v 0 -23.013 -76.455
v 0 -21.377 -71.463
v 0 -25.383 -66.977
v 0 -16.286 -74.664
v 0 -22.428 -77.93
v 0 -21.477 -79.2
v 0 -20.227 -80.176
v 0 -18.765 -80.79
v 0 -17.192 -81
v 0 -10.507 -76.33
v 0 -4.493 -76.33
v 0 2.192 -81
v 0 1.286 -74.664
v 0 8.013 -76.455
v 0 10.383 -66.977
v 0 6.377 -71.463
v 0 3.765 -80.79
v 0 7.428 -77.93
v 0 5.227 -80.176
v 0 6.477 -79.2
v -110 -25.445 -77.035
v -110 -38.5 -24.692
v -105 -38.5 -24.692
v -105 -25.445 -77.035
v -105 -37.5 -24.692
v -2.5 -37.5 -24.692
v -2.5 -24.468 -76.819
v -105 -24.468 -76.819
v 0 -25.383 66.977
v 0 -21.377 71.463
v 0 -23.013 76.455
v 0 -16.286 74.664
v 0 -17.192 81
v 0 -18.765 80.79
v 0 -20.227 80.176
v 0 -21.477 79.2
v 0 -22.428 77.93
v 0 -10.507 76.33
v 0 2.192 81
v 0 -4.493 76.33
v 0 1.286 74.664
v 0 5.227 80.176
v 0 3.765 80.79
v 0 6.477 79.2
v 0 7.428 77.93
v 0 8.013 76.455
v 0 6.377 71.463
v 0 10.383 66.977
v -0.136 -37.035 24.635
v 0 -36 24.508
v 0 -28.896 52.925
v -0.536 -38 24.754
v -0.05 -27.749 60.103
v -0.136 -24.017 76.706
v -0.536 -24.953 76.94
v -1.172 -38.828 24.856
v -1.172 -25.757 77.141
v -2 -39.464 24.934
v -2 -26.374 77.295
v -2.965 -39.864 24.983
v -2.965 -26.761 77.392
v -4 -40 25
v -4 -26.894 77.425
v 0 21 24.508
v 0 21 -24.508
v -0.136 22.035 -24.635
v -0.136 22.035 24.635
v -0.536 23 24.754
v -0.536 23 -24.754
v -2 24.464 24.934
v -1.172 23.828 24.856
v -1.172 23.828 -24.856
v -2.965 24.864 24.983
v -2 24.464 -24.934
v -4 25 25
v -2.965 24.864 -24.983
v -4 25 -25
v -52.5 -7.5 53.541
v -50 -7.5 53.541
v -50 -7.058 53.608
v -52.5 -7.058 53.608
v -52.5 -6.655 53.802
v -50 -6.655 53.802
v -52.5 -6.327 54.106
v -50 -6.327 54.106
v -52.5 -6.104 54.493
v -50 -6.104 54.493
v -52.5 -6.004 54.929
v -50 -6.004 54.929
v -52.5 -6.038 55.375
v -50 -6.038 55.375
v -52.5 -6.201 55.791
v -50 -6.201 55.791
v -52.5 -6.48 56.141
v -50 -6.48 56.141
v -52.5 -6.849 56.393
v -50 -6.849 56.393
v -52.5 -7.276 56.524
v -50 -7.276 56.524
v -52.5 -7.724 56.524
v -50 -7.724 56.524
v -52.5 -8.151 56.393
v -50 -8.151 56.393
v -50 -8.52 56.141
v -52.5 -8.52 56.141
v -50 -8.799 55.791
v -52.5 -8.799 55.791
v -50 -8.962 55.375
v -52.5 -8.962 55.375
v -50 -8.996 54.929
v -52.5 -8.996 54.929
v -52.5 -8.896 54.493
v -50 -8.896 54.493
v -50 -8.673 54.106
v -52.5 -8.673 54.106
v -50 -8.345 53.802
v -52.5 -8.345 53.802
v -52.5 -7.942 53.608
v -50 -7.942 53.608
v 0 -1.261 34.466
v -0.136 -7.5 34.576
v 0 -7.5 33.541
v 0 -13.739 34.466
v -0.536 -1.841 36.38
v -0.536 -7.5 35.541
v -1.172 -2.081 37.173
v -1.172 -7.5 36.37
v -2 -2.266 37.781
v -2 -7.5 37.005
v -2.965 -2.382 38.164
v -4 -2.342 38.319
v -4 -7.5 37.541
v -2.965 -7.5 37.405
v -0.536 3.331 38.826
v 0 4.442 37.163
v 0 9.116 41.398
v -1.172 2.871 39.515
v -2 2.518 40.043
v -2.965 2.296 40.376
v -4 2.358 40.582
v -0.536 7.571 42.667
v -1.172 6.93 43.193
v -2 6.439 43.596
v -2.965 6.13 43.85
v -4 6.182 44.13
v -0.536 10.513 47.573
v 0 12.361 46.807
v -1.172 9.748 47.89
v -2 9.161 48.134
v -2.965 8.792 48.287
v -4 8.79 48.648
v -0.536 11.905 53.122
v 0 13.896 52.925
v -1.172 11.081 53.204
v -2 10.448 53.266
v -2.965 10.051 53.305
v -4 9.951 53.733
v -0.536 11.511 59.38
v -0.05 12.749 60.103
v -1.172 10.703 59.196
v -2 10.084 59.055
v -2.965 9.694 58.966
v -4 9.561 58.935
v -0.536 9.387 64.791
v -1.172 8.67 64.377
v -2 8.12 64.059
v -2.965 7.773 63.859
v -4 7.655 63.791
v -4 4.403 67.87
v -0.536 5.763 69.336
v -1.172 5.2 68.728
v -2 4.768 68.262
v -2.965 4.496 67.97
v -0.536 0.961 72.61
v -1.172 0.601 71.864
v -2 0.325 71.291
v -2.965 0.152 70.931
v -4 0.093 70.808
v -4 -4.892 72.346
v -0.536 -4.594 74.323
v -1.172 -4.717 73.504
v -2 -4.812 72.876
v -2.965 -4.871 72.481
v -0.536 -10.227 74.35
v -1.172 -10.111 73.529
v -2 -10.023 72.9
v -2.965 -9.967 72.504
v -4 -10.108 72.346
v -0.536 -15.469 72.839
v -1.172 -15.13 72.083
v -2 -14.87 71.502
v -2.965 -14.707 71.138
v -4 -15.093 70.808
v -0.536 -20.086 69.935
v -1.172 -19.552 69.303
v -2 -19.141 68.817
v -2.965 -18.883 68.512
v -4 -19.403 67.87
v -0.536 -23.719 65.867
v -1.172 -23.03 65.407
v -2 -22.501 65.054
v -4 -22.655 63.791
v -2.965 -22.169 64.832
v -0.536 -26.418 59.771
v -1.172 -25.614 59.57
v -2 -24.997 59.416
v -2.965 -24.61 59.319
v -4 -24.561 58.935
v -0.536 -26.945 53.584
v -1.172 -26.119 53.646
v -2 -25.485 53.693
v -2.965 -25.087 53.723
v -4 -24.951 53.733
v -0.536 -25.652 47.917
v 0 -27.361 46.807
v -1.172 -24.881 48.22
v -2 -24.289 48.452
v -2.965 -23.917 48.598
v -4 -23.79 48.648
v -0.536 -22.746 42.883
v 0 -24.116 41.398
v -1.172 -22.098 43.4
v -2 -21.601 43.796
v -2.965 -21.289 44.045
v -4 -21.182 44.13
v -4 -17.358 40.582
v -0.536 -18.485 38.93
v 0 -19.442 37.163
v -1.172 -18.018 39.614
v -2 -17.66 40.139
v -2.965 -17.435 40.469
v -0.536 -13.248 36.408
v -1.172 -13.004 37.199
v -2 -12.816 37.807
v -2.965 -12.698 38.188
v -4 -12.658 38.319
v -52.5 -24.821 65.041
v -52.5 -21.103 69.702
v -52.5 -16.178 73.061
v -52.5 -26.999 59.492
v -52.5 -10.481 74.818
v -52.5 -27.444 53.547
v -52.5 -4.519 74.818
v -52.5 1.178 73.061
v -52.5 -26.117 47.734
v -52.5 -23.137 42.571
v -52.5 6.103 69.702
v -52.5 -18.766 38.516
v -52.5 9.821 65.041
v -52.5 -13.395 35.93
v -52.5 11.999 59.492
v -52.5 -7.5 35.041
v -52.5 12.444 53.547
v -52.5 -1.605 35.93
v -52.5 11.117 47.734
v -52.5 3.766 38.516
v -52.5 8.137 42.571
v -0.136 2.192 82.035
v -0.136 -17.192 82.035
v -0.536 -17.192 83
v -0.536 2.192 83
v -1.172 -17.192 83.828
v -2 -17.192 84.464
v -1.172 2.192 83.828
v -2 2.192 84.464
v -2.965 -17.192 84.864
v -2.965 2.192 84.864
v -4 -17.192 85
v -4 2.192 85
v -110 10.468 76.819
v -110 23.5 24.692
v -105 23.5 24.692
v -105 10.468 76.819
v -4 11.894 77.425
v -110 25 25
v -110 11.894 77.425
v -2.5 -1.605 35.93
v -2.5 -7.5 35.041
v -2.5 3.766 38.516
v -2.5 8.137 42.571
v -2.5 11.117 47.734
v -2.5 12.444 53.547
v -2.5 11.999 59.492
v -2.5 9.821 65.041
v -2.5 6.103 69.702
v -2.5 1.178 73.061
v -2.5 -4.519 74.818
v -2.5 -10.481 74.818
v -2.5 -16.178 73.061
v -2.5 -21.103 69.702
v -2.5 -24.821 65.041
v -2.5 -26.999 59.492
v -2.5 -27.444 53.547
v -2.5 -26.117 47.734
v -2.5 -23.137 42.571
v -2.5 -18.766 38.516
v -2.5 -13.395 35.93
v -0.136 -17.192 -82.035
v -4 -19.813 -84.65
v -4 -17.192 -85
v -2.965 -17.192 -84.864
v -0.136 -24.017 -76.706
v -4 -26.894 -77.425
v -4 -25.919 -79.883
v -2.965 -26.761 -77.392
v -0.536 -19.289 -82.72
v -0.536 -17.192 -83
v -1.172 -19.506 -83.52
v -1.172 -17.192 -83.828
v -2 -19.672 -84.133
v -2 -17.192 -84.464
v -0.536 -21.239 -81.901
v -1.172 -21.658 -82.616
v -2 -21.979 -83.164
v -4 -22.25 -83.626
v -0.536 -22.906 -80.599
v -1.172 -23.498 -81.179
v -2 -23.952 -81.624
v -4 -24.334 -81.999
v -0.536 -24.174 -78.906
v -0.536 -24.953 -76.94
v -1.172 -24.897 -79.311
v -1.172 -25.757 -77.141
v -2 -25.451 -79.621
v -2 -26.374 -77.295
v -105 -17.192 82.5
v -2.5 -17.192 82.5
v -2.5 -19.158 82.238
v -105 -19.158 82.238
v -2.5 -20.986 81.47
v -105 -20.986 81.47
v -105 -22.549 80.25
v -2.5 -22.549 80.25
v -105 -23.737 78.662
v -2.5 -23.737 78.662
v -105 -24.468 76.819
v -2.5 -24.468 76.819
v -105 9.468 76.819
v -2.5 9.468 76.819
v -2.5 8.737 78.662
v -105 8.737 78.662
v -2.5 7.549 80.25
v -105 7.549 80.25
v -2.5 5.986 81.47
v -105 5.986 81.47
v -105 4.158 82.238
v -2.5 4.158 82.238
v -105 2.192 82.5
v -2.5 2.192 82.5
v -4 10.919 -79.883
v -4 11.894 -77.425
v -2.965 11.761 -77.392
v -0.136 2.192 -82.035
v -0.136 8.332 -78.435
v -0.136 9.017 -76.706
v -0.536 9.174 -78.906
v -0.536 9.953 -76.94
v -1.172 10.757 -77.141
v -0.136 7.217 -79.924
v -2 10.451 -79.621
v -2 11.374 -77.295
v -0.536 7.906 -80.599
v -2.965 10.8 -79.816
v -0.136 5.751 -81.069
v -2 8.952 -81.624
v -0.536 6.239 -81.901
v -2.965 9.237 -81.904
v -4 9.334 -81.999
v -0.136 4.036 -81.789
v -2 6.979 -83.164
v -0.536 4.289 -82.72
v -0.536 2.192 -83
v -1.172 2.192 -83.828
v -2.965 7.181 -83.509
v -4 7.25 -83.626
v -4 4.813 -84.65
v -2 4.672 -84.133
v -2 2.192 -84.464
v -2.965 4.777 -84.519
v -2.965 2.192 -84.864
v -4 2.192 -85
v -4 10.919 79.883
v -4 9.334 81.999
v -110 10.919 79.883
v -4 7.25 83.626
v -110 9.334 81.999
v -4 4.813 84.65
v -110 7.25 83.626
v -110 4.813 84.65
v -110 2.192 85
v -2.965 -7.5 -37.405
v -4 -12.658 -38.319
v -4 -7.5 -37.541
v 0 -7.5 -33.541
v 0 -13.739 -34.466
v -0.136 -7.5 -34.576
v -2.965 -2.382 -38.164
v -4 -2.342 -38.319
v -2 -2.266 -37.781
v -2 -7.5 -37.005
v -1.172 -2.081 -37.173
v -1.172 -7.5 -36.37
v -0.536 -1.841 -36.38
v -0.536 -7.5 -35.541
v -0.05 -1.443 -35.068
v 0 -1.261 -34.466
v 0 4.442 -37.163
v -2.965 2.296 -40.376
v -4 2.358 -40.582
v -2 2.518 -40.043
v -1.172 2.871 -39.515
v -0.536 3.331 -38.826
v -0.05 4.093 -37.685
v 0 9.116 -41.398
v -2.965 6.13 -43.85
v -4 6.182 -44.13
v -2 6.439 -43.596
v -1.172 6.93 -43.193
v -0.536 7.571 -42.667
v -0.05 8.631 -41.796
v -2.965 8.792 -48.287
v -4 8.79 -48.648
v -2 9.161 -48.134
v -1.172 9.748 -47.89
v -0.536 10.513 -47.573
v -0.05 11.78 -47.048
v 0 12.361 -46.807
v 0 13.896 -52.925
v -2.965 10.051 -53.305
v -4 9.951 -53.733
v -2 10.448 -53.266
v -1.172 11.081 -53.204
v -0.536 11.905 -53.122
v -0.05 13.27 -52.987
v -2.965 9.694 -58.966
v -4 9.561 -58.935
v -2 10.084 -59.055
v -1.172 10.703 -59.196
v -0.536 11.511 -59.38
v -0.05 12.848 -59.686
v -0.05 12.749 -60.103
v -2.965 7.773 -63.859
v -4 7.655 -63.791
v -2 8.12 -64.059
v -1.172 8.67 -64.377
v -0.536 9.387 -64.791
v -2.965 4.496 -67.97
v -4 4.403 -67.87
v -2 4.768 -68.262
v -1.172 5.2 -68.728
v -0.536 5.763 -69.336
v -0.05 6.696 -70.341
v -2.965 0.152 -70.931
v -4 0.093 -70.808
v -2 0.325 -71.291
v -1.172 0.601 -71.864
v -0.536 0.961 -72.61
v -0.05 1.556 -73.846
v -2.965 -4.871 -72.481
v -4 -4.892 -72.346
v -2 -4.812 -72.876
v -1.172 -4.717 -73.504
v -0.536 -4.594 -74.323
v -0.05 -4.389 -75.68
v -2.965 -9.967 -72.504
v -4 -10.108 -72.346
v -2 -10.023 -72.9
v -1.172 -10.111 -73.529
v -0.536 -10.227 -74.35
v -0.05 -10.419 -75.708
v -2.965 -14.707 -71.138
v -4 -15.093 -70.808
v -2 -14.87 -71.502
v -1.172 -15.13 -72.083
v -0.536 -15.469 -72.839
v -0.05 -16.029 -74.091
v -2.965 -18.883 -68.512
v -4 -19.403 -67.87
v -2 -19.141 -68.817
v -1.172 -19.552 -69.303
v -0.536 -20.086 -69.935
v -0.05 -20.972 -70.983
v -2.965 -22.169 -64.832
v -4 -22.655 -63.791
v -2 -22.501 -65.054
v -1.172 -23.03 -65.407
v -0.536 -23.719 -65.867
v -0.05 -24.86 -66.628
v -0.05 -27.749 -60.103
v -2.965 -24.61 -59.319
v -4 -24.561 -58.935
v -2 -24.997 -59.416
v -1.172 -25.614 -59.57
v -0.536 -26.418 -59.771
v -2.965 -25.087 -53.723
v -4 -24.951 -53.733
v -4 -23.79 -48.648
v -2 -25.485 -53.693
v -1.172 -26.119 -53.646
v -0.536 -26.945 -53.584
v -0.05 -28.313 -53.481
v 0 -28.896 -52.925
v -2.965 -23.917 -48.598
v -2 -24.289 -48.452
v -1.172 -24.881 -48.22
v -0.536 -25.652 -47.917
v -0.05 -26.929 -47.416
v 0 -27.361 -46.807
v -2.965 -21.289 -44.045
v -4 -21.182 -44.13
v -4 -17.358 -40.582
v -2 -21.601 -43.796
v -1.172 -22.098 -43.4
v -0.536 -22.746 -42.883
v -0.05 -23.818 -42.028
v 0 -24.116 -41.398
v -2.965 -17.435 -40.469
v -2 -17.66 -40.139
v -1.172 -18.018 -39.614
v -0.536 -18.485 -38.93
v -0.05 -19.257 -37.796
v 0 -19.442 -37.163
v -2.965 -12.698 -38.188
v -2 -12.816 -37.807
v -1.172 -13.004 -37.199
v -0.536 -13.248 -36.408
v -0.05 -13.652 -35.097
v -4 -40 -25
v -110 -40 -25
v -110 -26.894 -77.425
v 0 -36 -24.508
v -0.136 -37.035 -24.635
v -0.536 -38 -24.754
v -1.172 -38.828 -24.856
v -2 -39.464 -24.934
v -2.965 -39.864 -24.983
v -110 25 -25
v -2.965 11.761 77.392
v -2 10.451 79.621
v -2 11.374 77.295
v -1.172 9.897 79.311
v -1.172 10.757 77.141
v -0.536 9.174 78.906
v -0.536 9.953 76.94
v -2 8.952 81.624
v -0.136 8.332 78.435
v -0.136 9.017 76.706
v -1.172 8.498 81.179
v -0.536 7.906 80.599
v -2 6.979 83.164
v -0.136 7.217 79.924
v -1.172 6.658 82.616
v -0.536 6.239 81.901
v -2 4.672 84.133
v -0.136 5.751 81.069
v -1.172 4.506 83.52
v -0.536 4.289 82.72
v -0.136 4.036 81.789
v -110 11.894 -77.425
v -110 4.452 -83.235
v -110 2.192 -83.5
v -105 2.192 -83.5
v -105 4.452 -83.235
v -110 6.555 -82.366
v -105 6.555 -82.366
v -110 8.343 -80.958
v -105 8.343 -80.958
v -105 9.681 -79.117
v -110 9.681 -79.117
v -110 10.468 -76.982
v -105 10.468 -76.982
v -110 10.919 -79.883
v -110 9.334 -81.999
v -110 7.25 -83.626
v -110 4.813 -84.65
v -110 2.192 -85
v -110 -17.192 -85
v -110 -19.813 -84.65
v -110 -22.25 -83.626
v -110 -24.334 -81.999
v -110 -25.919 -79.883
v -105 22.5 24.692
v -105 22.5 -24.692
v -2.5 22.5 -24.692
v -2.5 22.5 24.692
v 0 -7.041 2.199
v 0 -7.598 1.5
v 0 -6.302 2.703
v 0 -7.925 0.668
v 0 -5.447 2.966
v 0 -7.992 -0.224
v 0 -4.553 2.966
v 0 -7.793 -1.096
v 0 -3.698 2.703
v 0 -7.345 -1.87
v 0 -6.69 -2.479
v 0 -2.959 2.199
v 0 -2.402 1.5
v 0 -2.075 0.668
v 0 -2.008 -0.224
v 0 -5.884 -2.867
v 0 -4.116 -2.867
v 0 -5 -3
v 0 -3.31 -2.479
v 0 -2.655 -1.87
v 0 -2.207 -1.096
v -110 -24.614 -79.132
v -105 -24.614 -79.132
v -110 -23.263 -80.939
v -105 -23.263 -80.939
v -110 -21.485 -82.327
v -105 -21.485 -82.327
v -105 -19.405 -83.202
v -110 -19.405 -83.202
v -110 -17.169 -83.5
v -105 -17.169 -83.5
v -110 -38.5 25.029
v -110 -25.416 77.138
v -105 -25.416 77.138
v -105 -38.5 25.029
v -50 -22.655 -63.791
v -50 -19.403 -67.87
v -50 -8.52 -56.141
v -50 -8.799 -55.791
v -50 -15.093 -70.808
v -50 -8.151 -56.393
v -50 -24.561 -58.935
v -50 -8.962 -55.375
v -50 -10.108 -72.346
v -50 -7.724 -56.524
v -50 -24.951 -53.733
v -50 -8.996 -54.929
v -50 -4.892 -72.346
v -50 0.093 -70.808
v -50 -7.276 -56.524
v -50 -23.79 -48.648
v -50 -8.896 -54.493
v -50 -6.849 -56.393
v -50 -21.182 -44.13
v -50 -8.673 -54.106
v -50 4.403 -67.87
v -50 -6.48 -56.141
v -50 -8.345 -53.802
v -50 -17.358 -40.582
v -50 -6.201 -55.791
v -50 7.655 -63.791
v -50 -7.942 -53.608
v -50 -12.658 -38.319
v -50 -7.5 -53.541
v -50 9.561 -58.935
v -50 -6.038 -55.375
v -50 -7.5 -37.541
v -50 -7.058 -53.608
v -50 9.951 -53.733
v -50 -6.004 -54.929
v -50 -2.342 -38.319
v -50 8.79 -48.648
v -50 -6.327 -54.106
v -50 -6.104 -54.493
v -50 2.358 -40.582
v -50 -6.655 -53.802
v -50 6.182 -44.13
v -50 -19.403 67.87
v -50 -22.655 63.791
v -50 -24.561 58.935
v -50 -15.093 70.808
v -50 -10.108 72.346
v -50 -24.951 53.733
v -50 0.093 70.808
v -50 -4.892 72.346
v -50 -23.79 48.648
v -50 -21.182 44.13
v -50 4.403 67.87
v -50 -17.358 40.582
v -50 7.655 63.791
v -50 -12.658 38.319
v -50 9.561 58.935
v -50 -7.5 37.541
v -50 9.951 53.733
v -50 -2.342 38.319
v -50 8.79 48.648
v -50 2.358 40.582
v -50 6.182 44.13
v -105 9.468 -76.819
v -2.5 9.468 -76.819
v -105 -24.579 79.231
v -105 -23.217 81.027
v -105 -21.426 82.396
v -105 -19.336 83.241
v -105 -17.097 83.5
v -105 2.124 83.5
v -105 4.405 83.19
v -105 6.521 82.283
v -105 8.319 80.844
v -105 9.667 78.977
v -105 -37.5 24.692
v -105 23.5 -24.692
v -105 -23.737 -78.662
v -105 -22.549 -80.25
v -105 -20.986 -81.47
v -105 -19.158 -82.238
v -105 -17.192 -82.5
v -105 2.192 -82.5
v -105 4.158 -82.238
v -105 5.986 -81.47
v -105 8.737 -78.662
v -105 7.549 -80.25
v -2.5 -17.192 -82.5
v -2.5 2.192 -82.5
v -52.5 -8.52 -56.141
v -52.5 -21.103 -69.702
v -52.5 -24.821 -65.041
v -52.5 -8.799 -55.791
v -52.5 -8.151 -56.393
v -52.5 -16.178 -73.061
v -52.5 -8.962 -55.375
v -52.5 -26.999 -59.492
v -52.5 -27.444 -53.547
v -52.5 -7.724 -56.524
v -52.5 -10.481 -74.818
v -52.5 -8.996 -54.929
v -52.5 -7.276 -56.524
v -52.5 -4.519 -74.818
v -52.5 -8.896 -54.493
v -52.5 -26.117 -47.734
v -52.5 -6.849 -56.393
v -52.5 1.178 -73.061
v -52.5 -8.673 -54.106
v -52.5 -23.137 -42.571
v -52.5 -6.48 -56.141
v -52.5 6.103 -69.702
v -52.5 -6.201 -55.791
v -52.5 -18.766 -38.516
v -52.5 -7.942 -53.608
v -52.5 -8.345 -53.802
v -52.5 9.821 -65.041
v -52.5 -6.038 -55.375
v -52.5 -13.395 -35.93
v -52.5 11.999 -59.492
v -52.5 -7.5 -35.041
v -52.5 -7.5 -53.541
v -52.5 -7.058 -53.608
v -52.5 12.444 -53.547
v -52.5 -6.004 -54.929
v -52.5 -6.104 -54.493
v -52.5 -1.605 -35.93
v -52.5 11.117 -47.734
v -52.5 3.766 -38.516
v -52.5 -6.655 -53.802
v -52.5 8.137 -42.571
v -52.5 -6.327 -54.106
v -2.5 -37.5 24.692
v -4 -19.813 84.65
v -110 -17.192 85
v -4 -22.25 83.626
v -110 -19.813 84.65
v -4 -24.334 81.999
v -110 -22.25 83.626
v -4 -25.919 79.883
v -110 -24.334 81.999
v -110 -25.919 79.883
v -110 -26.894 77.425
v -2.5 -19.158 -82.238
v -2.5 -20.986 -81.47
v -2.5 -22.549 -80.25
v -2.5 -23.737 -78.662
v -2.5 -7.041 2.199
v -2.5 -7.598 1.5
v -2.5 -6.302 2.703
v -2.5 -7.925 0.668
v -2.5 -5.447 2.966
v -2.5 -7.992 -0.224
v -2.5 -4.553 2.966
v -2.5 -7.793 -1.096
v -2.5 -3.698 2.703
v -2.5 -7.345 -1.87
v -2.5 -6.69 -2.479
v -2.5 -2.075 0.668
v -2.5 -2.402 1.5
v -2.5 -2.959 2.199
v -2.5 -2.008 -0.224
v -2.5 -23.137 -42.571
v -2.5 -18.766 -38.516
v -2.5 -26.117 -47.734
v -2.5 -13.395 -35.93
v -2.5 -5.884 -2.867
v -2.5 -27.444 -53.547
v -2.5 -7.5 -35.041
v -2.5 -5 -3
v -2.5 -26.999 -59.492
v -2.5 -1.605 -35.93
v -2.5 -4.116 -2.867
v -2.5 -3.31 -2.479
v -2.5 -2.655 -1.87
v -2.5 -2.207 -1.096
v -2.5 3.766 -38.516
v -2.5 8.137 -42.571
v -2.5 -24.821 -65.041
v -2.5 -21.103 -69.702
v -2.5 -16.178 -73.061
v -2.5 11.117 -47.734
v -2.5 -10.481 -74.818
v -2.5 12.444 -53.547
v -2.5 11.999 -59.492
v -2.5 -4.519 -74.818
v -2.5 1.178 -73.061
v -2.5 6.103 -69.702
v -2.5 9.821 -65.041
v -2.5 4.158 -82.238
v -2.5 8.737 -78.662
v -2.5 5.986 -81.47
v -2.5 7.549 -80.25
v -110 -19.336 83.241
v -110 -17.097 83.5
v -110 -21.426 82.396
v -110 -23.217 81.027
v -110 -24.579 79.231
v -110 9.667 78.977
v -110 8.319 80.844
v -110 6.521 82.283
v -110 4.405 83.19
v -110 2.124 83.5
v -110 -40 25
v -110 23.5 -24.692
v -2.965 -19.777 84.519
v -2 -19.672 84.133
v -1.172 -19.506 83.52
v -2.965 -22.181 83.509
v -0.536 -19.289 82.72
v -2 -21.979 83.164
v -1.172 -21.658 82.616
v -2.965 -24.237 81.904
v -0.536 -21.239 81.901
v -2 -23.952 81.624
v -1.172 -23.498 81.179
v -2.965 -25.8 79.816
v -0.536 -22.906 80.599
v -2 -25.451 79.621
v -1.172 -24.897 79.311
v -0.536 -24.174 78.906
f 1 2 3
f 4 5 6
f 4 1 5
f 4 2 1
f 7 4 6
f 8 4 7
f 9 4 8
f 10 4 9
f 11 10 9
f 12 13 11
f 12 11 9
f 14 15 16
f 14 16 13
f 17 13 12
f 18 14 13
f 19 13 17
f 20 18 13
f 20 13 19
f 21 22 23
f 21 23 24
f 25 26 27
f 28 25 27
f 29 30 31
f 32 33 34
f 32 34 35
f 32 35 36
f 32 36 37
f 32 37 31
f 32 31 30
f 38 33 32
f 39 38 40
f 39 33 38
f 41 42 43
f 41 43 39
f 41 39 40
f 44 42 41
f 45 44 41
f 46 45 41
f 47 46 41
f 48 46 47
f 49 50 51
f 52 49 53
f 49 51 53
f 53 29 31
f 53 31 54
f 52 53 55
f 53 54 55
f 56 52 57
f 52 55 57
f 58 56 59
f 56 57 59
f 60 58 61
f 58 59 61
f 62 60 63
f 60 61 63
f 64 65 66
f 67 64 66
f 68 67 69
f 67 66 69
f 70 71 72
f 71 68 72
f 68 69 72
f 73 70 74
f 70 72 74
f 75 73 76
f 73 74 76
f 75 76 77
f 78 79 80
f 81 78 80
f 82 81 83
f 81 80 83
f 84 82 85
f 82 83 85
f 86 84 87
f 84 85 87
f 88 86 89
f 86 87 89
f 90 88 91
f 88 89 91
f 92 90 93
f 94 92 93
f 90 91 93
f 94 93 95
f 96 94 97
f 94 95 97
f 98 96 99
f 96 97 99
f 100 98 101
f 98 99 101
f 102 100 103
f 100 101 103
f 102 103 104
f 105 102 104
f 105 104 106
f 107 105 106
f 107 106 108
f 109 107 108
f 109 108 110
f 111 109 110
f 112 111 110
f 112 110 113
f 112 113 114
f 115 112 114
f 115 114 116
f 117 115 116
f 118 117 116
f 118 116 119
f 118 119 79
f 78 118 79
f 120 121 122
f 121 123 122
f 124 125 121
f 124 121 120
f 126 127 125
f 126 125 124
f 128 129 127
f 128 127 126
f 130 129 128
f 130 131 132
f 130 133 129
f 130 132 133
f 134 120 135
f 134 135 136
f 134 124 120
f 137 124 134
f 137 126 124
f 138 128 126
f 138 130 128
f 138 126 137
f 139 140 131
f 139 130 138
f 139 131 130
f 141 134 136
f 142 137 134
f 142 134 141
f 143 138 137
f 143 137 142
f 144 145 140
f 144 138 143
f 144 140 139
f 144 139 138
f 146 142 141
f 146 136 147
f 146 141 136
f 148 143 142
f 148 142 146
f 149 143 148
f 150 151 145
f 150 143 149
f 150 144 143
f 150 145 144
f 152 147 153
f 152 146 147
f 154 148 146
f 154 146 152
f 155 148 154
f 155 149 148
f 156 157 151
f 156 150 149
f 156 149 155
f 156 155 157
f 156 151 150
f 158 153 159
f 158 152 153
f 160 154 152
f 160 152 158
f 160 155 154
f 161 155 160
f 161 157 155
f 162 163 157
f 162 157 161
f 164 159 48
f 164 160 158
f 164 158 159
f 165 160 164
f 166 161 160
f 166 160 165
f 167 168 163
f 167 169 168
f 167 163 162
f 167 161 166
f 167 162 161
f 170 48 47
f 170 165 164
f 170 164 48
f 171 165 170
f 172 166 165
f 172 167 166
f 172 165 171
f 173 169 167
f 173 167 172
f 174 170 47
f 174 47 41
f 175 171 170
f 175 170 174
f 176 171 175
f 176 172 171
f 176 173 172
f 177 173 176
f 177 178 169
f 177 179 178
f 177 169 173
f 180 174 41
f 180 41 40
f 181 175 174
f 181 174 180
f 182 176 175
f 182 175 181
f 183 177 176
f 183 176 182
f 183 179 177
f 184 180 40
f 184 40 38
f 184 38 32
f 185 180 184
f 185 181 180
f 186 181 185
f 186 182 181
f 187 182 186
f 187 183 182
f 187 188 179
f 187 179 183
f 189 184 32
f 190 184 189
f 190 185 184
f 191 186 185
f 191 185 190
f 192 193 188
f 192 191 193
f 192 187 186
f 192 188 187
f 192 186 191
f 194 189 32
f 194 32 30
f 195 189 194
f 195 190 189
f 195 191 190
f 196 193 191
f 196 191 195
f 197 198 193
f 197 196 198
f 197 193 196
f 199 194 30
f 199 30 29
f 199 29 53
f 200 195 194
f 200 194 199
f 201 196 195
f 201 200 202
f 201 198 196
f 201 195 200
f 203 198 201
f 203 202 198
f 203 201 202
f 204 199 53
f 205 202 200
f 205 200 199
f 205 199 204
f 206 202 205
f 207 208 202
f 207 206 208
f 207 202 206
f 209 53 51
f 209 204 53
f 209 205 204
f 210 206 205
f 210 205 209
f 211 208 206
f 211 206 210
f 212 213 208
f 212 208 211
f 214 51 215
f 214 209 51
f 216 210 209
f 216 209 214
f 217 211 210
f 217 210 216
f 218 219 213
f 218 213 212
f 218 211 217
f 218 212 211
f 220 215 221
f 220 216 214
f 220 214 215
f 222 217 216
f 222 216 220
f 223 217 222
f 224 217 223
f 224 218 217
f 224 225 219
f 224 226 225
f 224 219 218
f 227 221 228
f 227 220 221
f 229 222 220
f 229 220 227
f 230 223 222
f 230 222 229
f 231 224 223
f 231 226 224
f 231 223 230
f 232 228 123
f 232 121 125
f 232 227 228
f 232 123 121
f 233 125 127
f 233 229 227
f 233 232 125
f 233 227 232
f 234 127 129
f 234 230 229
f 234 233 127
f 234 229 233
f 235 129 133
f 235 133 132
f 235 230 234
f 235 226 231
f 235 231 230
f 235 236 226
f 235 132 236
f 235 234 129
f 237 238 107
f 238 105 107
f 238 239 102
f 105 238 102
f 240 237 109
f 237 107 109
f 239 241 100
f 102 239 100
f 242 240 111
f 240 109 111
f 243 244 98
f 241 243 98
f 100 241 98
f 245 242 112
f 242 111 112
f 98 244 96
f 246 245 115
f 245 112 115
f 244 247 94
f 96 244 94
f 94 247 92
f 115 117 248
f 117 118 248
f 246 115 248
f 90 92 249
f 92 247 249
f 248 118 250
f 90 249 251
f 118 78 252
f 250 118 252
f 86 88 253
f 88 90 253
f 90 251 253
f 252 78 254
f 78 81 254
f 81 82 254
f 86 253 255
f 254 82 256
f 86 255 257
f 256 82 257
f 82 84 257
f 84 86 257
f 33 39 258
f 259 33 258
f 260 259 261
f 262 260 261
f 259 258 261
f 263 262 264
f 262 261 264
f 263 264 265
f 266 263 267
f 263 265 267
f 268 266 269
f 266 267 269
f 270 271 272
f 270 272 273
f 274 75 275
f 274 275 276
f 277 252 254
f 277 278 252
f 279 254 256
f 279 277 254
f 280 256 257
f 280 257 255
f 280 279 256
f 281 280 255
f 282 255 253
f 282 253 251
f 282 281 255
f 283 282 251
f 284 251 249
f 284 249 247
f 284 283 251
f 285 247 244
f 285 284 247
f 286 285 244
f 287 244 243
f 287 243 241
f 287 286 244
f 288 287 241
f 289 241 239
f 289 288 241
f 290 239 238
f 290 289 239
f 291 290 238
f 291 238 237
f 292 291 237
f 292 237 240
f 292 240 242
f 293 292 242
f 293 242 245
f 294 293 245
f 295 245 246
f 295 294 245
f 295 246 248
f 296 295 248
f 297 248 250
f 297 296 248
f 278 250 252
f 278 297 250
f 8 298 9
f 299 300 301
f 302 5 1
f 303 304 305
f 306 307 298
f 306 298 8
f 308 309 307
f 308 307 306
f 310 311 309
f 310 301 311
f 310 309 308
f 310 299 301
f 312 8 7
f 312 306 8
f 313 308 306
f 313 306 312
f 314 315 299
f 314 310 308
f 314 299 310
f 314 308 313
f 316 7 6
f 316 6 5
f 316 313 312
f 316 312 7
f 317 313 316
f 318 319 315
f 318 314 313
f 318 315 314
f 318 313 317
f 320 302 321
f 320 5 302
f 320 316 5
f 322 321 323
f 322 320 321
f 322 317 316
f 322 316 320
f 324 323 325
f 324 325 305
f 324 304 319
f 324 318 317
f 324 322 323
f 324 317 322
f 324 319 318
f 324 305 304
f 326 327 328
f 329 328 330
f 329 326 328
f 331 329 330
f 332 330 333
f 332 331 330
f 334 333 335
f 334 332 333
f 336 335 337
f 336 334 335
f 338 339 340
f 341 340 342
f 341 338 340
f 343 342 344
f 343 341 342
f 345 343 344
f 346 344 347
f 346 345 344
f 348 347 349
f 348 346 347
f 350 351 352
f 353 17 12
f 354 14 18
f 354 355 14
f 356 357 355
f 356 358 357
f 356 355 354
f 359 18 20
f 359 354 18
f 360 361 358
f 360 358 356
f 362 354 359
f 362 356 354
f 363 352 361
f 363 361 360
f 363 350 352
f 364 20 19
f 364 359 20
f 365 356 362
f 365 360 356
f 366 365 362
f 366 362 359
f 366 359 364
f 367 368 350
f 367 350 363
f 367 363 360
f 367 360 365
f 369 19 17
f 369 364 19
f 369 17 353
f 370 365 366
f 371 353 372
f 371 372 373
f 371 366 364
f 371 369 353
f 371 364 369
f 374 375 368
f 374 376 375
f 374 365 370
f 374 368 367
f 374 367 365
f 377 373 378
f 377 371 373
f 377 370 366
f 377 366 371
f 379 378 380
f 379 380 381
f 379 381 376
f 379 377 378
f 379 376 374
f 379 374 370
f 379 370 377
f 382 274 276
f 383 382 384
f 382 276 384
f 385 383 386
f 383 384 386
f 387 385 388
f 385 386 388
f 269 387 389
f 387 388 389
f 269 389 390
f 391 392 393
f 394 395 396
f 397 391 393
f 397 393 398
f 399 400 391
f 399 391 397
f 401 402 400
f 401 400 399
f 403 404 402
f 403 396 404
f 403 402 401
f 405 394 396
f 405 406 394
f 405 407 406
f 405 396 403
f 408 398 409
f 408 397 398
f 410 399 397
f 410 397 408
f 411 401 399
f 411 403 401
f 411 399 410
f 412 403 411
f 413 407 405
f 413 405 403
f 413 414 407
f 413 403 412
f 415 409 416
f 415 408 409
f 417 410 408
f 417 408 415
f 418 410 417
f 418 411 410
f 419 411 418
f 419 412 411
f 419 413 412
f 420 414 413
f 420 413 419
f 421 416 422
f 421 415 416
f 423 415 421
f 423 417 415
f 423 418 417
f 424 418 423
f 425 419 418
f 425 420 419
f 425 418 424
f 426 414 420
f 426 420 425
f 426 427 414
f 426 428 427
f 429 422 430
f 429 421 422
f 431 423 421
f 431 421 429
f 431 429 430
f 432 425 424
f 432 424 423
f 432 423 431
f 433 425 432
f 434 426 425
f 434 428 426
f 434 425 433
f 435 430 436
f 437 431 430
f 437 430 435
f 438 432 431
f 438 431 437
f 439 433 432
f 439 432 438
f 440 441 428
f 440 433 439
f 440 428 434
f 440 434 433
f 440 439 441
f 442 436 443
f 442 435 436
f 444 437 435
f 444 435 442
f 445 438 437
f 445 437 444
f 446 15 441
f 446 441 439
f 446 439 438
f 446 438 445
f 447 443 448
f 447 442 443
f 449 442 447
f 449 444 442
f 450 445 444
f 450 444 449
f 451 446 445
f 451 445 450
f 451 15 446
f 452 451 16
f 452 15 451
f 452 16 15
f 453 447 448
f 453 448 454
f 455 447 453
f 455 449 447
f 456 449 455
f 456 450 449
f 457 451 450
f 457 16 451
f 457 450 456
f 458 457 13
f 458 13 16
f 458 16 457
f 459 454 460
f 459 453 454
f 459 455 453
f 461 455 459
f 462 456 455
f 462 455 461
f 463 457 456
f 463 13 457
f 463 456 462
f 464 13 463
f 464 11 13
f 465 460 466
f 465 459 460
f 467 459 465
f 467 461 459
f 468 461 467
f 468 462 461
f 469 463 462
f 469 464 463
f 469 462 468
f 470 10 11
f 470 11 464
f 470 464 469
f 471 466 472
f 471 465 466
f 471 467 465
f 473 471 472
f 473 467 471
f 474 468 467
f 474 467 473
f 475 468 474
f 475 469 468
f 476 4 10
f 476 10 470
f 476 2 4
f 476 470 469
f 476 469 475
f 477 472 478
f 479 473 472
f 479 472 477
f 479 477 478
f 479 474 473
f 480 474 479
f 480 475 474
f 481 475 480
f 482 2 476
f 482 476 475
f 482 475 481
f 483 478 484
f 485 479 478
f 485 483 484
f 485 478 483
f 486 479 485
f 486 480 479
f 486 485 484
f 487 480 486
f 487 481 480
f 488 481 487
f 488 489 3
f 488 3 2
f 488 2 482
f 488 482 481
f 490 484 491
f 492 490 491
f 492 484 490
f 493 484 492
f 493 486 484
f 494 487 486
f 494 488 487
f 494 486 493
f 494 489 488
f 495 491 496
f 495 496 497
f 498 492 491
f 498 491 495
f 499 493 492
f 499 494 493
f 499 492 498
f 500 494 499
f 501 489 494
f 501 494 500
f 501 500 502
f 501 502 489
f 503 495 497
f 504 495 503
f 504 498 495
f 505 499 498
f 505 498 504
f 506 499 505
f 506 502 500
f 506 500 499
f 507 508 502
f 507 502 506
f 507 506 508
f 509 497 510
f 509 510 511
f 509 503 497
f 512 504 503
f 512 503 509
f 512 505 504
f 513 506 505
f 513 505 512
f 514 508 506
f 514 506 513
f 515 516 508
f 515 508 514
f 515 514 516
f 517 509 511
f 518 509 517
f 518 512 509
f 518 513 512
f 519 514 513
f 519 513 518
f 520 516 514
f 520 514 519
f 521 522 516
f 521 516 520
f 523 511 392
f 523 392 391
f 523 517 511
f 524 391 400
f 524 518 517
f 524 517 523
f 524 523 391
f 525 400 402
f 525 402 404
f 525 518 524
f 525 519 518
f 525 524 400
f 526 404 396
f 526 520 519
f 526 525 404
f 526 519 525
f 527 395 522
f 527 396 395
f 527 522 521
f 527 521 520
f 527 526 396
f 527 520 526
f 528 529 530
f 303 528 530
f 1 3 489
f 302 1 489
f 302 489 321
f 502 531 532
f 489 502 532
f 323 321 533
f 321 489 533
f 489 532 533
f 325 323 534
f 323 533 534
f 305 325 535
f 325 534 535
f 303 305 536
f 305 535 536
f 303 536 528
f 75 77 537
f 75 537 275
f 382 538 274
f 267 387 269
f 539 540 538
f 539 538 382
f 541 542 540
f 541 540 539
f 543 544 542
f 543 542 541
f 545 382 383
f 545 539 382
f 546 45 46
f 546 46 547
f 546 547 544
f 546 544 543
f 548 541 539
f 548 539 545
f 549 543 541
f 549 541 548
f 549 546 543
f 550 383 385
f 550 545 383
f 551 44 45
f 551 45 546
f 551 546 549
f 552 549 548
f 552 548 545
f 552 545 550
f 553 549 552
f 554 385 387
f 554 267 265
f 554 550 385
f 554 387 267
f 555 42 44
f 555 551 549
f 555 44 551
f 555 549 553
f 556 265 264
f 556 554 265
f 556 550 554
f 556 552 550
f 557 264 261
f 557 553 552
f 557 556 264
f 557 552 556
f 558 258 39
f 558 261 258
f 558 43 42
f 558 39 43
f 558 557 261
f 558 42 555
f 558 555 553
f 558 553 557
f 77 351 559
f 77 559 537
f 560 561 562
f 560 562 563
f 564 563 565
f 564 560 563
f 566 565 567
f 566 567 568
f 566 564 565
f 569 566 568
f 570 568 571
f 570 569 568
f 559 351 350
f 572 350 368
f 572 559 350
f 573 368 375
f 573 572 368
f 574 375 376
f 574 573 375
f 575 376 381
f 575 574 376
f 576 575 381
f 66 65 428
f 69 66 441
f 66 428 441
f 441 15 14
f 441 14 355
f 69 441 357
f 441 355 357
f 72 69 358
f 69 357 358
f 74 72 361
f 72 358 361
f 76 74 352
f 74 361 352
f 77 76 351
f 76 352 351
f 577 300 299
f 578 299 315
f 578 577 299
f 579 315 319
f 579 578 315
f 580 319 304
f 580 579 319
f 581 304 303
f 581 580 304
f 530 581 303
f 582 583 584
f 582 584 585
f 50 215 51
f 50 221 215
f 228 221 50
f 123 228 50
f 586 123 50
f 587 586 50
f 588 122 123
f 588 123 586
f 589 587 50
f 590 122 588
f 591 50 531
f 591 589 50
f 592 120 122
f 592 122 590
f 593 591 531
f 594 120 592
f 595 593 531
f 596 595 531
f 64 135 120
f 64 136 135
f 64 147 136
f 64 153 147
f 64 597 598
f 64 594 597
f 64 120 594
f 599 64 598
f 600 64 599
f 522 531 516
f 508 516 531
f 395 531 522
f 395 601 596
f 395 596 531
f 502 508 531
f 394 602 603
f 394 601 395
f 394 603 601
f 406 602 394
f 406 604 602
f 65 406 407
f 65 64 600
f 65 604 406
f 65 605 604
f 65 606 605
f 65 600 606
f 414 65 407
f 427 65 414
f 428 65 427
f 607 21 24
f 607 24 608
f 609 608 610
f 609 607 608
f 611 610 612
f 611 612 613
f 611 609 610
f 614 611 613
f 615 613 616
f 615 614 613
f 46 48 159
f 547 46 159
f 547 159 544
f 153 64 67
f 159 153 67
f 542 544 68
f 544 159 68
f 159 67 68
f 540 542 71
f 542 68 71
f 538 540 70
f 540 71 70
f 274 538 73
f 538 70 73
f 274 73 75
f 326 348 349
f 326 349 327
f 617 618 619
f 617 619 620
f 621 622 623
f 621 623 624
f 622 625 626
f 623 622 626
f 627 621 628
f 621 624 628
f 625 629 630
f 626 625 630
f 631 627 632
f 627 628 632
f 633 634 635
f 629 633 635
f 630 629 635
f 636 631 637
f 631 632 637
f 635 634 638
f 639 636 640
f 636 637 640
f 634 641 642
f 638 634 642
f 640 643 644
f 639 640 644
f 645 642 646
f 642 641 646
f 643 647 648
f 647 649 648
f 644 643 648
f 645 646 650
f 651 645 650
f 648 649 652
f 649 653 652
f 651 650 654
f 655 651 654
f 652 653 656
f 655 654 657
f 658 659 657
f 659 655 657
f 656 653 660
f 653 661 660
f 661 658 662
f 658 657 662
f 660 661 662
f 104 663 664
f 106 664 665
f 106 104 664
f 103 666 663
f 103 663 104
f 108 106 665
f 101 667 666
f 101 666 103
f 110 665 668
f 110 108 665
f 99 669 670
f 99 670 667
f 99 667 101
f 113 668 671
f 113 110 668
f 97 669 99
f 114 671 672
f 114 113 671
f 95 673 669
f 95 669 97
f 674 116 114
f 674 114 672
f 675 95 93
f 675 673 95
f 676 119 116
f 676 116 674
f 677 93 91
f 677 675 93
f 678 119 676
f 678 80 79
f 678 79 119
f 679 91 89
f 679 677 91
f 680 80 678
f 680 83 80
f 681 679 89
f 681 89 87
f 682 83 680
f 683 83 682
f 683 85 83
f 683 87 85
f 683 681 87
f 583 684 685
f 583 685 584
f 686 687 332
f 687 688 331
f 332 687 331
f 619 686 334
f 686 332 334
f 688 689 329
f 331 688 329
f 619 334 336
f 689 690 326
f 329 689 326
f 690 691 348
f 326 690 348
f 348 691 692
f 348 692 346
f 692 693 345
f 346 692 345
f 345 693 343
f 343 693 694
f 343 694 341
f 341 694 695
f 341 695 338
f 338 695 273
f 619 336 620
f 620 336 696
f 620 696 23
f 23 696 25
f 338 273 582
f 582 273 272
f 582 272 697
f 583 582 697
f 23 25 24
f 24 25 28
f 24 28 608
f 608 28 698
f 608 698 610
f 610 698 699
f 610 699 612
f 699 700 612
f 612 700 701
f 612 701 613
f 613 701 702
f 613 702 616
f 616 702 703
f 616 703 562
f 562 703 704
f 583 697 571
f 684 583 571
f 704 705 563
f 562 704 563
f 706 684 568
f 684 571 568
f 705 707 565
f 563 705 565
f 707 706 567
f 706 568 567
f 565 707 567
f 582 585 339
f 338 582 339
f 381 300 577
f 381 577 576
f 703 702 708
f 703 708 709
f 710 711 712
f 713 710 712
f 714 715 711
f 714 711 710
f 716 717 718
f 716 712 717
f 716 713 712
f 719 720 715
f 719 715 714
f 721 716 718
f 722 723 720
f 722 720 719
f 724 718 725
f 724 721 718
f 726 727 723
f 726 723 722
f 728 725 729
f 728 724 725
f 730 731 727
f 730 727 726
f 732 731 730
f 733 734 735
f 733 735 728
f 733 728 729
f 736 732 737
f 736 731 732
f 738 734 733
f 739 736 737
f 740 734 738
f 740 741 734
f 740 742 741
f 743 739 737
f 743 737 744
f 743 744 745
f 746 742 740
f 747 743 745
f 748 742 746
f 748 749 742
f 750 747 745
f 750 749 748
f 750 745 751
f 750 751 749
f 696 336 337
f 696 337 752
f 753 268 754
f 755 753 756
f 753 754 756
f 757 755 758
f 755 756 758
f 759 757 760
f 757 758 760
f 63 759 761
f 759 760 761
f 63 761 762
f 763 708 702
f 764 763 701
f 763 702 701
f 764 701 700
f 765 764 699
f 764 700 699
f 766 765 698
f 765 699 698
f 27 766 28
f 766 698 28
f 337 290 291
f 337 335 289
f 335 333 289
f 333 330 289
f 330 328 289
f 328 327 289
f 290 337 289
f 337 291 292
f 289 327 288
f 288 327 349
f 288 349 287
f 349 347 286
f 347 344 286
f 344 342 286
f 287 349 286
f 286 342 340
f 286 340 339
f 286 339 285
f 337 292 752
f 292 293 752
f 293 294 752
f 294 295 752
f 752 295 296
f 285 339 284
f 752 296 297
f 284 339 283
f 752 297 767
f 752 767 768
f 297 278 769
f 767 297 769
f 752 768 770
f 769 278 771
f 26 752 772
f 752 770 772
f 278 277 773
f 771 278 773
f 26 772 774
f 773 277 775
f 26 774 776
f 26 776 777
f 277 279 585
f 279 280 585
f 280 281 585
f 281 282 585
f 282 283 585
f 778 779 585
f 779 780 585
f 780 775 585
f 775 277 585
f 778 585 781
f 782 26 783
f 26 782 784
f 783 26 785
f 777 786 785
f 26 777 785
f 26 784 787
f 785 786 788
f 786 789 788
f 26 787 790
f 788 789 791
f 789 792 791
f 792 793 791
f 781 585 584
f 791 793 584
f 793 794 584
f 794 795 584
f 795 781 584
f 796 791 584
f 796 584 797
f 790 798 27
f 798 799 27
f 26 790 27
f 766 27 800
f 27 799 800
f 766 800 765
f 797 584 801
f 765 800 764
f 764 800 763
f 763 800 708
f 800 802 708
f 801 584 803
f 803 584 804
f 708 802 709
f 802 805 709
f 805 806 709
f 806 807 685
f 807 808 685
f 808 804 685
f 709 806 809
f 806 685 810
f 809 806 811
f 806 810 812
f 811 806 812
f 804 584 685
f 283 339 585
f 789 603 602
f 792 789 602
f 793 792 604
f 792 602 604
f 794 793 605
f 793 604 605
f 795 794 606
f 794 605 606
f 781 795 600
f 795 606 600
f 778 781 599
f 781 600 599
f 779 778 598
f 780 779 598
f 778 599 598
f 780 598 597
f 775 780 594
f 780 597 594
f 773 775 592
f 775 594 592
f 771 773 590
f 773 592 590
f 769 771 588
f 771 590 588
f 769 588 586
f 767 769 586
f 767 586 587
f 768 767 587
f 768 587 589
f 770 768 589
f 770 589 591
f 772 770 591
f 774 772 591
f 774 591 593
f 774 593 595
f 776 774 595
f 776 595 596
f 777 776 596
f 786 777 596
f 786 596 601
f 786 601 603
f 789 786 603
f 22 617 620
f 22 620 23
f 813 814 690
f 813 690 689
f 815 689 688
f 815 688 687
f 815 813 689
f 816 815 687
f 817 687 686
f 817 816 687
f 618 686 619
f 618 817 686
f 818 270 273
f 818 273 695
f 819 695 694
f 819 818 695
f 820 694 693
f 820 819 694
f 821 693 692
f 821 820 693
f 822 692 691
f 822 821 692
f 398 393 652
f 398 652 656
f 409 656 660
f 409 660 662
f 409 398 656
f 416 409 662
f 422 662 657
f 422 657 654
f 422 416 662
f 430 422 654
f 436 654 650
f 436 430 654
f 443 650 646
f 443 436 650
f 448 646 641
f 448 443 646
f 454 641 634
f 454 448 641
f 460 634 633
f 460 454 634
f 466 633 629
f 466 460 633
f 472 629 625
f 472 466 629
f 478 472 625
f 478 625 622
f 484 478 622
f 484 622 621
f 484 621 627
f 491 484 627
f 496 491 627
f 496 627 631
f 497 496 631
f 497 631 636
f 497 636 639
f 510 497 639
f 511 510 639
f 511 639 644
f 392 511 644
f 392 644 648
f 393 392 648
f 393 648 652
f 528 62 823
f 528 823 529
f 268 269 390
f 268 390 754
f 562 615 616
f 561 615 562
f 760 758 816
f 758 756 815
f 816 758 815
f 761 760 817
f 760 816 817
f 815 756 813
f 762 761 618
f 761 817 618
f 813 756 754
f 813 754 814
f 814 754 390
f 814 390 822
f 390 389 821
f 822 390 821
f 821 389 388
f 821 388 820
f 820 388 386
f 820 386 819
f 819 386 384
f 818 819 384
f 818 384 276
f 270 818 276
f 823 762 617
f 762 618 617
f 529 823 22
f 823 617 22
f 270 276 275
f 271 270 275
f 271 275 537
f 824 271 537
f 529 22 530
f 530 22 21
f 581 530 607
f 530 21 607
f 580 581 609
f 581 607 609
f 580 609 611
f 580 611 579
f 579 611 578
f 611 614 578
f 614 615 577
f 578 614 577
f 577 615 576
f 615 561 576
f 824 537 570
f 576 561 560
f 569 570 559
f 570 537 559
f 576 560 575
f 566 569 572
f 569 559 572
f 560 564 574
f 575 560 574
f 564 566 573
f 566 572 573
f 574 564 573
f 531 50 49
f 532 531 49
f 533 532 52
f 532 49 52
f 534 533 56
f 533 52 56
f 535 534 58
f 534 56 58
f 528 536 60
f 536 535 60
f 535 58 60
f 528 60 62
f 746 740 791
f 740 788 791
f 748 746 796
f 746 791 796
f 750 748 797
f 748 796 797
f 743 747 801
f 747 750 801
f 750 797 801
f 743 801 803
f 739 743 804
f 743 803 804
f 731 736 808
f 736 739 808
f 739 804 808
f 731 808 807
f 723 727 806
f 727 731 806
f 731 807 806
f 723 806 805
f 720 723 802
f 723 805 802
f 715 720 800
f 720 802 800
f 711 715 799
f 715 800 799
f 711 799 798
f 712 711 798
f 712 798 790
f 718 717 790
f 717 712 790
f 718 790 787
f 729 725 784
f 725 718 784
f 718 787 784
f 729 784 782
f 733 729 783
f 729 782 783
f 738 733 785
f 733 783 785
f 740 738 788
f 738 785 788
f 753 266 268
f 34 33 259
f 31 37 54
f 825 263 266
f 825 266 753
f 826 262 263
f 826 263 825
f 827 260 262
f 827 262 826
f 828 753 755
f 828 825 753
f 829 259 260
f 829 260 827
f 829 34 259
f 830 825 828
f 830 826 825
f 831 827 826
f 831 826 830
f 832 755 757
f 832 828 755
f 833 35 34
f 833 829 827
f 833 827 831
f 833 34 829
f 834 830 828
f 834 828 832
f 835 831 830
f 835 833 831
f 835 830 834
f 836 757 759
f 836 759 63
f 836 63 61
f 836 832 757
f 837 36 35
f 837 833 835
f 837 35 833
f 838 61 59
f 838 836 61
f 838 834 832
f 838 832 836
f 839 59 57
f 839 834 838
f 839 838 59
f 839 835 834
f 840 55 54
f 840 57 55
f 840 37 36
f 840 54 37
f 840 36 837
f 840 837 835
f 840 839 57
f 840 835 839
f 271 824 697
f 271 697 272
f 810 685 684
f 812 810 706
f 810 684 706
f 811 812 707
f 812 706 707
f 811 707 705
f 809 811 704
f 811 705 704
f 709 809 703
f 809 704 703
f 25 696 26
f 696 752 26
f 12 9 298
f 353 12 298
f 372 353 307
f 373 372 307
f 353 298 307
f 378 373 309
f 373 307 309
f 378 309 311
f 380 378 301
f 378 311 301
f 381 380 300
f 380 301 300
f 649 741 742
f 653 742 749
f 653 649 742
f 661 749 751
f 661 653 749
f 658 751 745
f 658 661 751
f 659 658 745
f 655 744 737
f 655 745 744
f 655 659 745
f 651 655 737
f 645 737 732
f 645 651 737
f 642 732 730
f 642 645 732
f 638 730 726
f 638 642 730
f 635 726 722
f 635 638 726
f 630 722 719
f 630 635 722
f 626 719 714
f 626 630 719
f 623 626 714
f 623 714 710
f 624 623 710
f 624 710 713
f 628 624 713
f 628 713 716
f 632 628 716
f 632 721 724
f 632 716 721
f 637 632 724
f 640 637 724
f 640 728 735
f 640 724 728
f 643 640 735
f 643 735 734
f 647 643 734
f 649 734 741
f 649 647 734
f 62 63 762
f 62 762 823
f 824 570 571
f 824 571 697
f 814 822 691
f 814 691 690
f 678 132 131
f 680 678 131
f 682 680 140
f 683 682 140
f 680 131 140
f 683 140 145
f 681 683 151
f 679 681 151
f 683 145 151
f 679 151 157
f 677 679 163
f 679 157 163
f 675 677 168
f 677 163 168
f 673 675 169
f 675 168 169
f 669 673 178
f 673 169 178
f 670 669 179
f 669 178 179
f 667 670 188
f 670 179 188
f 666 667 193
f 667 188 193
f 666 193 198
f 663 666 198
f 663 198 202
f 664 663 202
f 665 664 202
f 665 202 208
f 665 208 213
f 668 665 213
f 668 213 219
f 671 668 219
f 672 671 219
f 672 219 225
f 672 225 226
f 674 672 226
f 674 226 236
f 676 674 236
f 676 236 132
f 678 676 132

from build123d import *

# Parameters (mm, degrees)
BOSS_EXTRUDE1_DEPTH = 110
SKETCH2_R           = 17.5
CUT_EXTRUDE1_DEPTH  = 50
FILLET1_R           = 10
SHELL1_T            = -2.5
CUT_EXTRUDE4_DEPTH  = 5
FILLET2_R           = 4
SKETCH5_R           = 3
CUT_EXTRUDE5_DEPTH  = 20
SKETCH6_R           = 1.5
CUT_EXTRUDE6_DEPTH  = 20


with BuildPart() as part:
    # Sketch1 → Boss-Extrude1 (new body)
    with BuildSketch(Plane(origin=(0, 0, 0), x_dir=(0, 0, -1), z_dir=(1, 0, 0))):
        Polygon((-25, 25), (-85, 10), (-85, -25), (-25, -40), (25, -40), (85, -25), (85, 10), (25, 25), align=None)
    extrude(amount=-BOSS_EXTRUDE1_DEPTH)

    # Sketch2 → Cut-Extrude1 (cut)
    with BuildSketch(Plane(origin=(0, 0, 0), x_dir=(0, 0, -1), z_dir=(1, 0, 0))):
        with Locations((-55.041193262, -7.5)):
            Circle(SKETCH2_R)
    cut_extrude1 = extrude(amount=-CUT_EXTRUDE1_DEPTH, mode=Mode.SUBTRACT)

    # Fillet1
    fillet1_edges = [part.edges().sort_by_distance(p)[0] for p in [
        (-55, 10, -85),
        (-55, -25, -85),
        (-55, -25, 85),
        (-55, 10, 85),
    ]]
    fillet(fillet1_edges, radius=FILLET1_R)

    # Mirror1: Cut-Extrude1 across plane
    add(cut_extrude1.mirror(Plane.XY), mode=Mode.SUBTRACT)

    # Shell1
    shell1_openings = [part.faces().sort_by_distance(p)[0] for p in [
        (-110, -7.5, 0),
    ]]
    offset(amount=SHELL1_T, openings=shell1_openings, kind=Kind.INTERSECTION)

    # Sketch4 → Cut-Extrude4 (cut)
    with BuildSketch(Plane.ZY.offset(110)):
        with BuildLine():
            Line((-24.692235936, 23.5), (24.692235936, 23.5))
            Line((24.692235936, 23.5), (76.819017188, 10.468304687))
            ThreePointArc((76.819017188, 10.468304687), (81.623972971, 7.468623928), (83.5, 2.123887516))
            Line((83.5, 2.123887516), (83.5, -2.844969352))
            Line((83.5, -2.844969352), (83.5, -17.097430261))
            ThreePointArc((83.5, -17.097430261), (81.771400928, -22.367488253), (77.138058264, -25.416045575))
            Line((77.138058264, -25.416045575), (25.028869166, -38.5))
            Line((25.028869166, -38.5), (-24.692235936, -38.5))
            Line((-24.692235936, -38.5), (-77.034521995, -25.444807466))
            ThreePointArc((-77.034521995, -25.444807466), (-81.692018142, -22.419765778), (-83.5, -17.168637406))
            Line((-83.5, -17.168637406), (-83.5, -2.807764064))
            Line((-83.5, -2.807764064), (-83.5, 2.192235936))
            ThreePointArc((-83.5, 2.192235936), (-81.723124679, 7.497578438), (-76.981950719, 10.468304687))
            Line((-76.981950719, 10.468304687), (-24.692235936, 23.5))
        make_face()
        with BuildLine():
            Line((-24.692235936, 22.5), (24.692235936, 22.5))
            Line((24.692235936, 22.5), (76.819017188, 9.468304687))
            ThreePointArc((76.819017188, 9.468304687), (80.911540785, 6.807827506), (82.5, 2.192235936))
            Line((82.5, 2.192235936), (82.5, -17.192235936))
            ThreePointArc((82.5, -17.192235936), (80.911540785, -21.807827506), (76.819017188, -24.468304687))
            Line((76.819017188, -24.468304687), (24.692235936, -37.5))
            Line((24.692235936, -37.5), (-24.692235936, -37.5))
            Line((-24.692235936, -37.5), (-76.819017188, -24.468304687))
            ThreePointArc((-76.819017188, -24.468304687), (-80.911540785, -21.807827506), (-82.5, -17.192235936))
            Line((-82.5, -17.192235936), (-82.5, 2.192235936))
            ThreePointArc((-82.5, 2.192235936), (-80.911540785, 6.807827506), (-76.819017188, 9.468304687))
            Line((-76.819017188, 9.468304687), (-24.692235936, 22.5))
        make_face(mode=Mode.SUBTRACT)
    extrude(amount=-CUT_EXTRUDE4_DEPTH, mode=Mode.SUBTRACT)

    # Fillet2
    # the kernel refuses this fillet: 4 mm, written as the material it takes off along each edge
    with BuildSketch(Plane(origin=(0, 27.42535625, 15.298574999), x_dir=(-1, 0, 0), z_dir=(0, -0.2425356250363329, 0.970142500145332))) as fillet2_piece_1:
        with BuildLine():
            CenterArc((FILLET2_R, FILLET2_R), FILLET2_R, 180, 90)
            Line((0, FILLET2_R), (0, 0))
            Line((0, 0), (FILLET2_R, 0))
        make_face()
    extrude(amount=64.03882032, mode=Mode.SUBTRACT)
    with BuildSketch(Plane(origin=(0, 25, -35), x_dir=(0, -1, 0), z_dir=(0, 0, 1)), Plane(origin=(0, -40, 35), x_dir=(0, 1, 0), z_dir=(0, 0, -1))) as fillet2_piece_2:
        with BuildLine():
            CenterArc((FILLET2_R, -FILLET2_R), FILLET2_R, 90, 90)
            Line((0, -FILLET2_R), (0, 0))
            Line((0, 0), (FILLET2_R, 0))
        make_face()
    extrude(amount=70, mode=Mode.SUBTRACT)
    with BuildSketch(Plane(origin=(0, -7.5, 55.041193262), x_dir=(0, 0, -1), z_dir=(0, -1, 0))) as fillet2_piece_3:
        with BuildLine():
            CenterArc((17.5 + FILLET2_R, -FILLET2_R), FILLET2_R, 90, 90)
            Line((17.5, -FILLET2_R), (17.5, 0))
            Line((17.5, 0), (17.5 + FILLET2_R, 0))
        make_face()
    revolve(axis=Axis((0, -7.5, 55.041193262), (1, 0, 0)), mode=Mode.SUBTRACT)
    with BuildSketch(Plane(origin=(0, 2.192235936, 85), x_dir=(0, 0, -1), z_dir=(0, -1, 0)), Plane(origin=(0, -17.192235936, -85), x_dir=(0, 0, 1), z_dir=(0, 1, 0))) as fillet2_piece_4:
        with BuildLine():
            CenterArc((FILLET2_R, -FILLET2_R), FILLET2_R, 90, 90)
            Line((0, -FILLET2_R), (0, 0))
            Line((0, 0), (FILLET2_R, 0))
        make_face()
    extrude(amount=19.384471872, mode=Mode.SUBTRACT)
    with BuildSketch(Plane(origin=(0, -26.893660937, 77.42535625), x_dir=(0, 0.970142500145332, -0.24253562503633308), z_dir=(0, -0.24253562503633302, -0.9701425001453319)), Plane(origin=(0, 11.893660937, -77.42535625), x_dir=(0, -0.9701425001453319, 0.24253562503633322), z_dir=(0, 0.24253562503633322, 0.9701425001453319)), Plane(origin=(0, -42.42535625, -15.298574999), x_dir=(0, 0.9701425001453319, 0.2425356250363329), z_dir=(0, 0.24253562503633294, -0.970142500145332))) as fillet2_piece_5:
        with BuildLine():
            CenterArc((FILLET2_R, -FILLET2_R), FILLET2_R, 90, 90)
            Line((0, -FILLET2_R), (0, 0))
            Line((0, 0), (FILLET2_R, 0))
        make_face()
    extrude(amount=64.03882032, mode=Mode.SUBTRACT)
    with BuildSketch(Plane(origin=(0, 2.192235936, 75), x_dir=(0, 0.970142500145332, 0.2425356250363322), z_dir=(0, 0.2425356250363322, -0.970142500145332))) as fillet2_piece_6:
        with BuildLine():
            CenterArc((10 - FILLET2_R, -FILLET2_R), FILLET2_R, 0, 90)
            Line((10, -FILLET2_R), (10, 0))
            Line((10, 0), (10 - FILLET2_R, 0))
        make_face()
    revolve(axis=Axis((0, 2.192235936, 75), (1, 0, 0)), revolution_arc=75.963756532, mode=Mode.SUBTRACT)
    with BuildSketch(Plane(origin=(0, -17.192235936, 75), x_dir=(0, 0, 1), z_dir=(0, 1, 0))) as fillet2_piece_7:
        with BuildLine():
            CenterArc((10 - FILLET2_R, -FILLET2_R), FILLET2_R, 0, 90)
            Line((10, -FILLET2_R), (10, 0))
            Line((10, 0), (10 - FILLET2_R, 0))
        make_face()
    revolve(axis=Axis((0, -17.192235936, 75), (1, 0, 0)), revolution_arc=75.963756532, mode=Mode.SUBTRACT)
    with BuildSketch(Plane(origin=(0, 2.192235936, -75), x_dir=(0, 0.9701425001453317, -0.2425356250363336), z_dir=(0, 0.2425356250363336, 0.9701425001453317))) as fillet2_piece_8:
        with BuildLine():
            CenterArc((10 - FILLET2_R, FILLET2_R), FILLET2_R, 270, 90)
            Line((10, FILLET2_R), (10, 0))
            Line((10, 0), (10 - FILLET2_R, 0))
        make_face()
    revolve(axis=Axis((0, 2.192235936, -75), (-1, 0, 0)), revolution_arc=75.963756532, mode=Mode.SUBTRACT)
    with BuildSketch(Plane(origin=(0, -17.192235936, -75), x_dir=(0, 0, -1), z_dir=(0, 1, 0))) as fillet2_piece_9:
        with BuildLine():
            CenterArc((10 - FILLET2_R, FILLET2_R), FILLET2_R, 270, 90)
            Line((10, FILLET2_R), (10, 0))
            Line((10, 0), (10 - FILLET2_R, 0))
        make_face()
    revolve(axis=Axis((0, -17.192235936, -75), (-1, 0, 0)), revolution_arc=75.963756532, mode=Mode.SUBTRACT)
    with BuildSketch(Plane(origin=(0, -7.5, -55.041193262), x_dir=(0, 0, 1), z_dir=(0, -1, 0))) as fillet2_piece_10:
        with BuildLine():
            CenterArc((17.5 + FILLET2_R, FILLET2_R), FILLET2_R, 180, 90)
            Line((17.5, FILLET2_R), (17.5, 0))
            Line((17.5, 0), (17.5 + FILLET2_R, 0))
        make_face()
    revolve(axis=Axis((0, -7.5, -55.041193262), (-1, 0, 0)), mode=Mode.SUBTRACT)

    # Sketch5 → Cut-Extrude5 (cut)
    with BuildSketch(Plane(origin=(0, 0, 0), x_dir=(0, 0, -1), z_dir=(1, 0, 0))):
        with Locations((0, -5)):
            Circle(SKETCH5_R)
    extrude(amount=-CUT_EXTRUDE5_DEPTH, mode=Mode.SUBTRACT)

    # Sketch6 → Cut-Extrude6 (cut)
    with BuildSketch(Plane(origin=(-50, 0, 0), x_dir=(0, 0, -1), z_dir=(1, 0, 0))):
        with Locations((-55.041193262, -7.5)):
            Circle(SKETCH6_R)
    cut_extrude6 = extrude(amount=-CUT_EXTRUDE6_DEPTH, mode=Mode.SUBTRACT)

    # Mirror3: Cut-Extrude6 across plane
    add(cut_extrude6.mirror(Plane.XY), mode=Mode.SUBTRACT)


solid = part.part
